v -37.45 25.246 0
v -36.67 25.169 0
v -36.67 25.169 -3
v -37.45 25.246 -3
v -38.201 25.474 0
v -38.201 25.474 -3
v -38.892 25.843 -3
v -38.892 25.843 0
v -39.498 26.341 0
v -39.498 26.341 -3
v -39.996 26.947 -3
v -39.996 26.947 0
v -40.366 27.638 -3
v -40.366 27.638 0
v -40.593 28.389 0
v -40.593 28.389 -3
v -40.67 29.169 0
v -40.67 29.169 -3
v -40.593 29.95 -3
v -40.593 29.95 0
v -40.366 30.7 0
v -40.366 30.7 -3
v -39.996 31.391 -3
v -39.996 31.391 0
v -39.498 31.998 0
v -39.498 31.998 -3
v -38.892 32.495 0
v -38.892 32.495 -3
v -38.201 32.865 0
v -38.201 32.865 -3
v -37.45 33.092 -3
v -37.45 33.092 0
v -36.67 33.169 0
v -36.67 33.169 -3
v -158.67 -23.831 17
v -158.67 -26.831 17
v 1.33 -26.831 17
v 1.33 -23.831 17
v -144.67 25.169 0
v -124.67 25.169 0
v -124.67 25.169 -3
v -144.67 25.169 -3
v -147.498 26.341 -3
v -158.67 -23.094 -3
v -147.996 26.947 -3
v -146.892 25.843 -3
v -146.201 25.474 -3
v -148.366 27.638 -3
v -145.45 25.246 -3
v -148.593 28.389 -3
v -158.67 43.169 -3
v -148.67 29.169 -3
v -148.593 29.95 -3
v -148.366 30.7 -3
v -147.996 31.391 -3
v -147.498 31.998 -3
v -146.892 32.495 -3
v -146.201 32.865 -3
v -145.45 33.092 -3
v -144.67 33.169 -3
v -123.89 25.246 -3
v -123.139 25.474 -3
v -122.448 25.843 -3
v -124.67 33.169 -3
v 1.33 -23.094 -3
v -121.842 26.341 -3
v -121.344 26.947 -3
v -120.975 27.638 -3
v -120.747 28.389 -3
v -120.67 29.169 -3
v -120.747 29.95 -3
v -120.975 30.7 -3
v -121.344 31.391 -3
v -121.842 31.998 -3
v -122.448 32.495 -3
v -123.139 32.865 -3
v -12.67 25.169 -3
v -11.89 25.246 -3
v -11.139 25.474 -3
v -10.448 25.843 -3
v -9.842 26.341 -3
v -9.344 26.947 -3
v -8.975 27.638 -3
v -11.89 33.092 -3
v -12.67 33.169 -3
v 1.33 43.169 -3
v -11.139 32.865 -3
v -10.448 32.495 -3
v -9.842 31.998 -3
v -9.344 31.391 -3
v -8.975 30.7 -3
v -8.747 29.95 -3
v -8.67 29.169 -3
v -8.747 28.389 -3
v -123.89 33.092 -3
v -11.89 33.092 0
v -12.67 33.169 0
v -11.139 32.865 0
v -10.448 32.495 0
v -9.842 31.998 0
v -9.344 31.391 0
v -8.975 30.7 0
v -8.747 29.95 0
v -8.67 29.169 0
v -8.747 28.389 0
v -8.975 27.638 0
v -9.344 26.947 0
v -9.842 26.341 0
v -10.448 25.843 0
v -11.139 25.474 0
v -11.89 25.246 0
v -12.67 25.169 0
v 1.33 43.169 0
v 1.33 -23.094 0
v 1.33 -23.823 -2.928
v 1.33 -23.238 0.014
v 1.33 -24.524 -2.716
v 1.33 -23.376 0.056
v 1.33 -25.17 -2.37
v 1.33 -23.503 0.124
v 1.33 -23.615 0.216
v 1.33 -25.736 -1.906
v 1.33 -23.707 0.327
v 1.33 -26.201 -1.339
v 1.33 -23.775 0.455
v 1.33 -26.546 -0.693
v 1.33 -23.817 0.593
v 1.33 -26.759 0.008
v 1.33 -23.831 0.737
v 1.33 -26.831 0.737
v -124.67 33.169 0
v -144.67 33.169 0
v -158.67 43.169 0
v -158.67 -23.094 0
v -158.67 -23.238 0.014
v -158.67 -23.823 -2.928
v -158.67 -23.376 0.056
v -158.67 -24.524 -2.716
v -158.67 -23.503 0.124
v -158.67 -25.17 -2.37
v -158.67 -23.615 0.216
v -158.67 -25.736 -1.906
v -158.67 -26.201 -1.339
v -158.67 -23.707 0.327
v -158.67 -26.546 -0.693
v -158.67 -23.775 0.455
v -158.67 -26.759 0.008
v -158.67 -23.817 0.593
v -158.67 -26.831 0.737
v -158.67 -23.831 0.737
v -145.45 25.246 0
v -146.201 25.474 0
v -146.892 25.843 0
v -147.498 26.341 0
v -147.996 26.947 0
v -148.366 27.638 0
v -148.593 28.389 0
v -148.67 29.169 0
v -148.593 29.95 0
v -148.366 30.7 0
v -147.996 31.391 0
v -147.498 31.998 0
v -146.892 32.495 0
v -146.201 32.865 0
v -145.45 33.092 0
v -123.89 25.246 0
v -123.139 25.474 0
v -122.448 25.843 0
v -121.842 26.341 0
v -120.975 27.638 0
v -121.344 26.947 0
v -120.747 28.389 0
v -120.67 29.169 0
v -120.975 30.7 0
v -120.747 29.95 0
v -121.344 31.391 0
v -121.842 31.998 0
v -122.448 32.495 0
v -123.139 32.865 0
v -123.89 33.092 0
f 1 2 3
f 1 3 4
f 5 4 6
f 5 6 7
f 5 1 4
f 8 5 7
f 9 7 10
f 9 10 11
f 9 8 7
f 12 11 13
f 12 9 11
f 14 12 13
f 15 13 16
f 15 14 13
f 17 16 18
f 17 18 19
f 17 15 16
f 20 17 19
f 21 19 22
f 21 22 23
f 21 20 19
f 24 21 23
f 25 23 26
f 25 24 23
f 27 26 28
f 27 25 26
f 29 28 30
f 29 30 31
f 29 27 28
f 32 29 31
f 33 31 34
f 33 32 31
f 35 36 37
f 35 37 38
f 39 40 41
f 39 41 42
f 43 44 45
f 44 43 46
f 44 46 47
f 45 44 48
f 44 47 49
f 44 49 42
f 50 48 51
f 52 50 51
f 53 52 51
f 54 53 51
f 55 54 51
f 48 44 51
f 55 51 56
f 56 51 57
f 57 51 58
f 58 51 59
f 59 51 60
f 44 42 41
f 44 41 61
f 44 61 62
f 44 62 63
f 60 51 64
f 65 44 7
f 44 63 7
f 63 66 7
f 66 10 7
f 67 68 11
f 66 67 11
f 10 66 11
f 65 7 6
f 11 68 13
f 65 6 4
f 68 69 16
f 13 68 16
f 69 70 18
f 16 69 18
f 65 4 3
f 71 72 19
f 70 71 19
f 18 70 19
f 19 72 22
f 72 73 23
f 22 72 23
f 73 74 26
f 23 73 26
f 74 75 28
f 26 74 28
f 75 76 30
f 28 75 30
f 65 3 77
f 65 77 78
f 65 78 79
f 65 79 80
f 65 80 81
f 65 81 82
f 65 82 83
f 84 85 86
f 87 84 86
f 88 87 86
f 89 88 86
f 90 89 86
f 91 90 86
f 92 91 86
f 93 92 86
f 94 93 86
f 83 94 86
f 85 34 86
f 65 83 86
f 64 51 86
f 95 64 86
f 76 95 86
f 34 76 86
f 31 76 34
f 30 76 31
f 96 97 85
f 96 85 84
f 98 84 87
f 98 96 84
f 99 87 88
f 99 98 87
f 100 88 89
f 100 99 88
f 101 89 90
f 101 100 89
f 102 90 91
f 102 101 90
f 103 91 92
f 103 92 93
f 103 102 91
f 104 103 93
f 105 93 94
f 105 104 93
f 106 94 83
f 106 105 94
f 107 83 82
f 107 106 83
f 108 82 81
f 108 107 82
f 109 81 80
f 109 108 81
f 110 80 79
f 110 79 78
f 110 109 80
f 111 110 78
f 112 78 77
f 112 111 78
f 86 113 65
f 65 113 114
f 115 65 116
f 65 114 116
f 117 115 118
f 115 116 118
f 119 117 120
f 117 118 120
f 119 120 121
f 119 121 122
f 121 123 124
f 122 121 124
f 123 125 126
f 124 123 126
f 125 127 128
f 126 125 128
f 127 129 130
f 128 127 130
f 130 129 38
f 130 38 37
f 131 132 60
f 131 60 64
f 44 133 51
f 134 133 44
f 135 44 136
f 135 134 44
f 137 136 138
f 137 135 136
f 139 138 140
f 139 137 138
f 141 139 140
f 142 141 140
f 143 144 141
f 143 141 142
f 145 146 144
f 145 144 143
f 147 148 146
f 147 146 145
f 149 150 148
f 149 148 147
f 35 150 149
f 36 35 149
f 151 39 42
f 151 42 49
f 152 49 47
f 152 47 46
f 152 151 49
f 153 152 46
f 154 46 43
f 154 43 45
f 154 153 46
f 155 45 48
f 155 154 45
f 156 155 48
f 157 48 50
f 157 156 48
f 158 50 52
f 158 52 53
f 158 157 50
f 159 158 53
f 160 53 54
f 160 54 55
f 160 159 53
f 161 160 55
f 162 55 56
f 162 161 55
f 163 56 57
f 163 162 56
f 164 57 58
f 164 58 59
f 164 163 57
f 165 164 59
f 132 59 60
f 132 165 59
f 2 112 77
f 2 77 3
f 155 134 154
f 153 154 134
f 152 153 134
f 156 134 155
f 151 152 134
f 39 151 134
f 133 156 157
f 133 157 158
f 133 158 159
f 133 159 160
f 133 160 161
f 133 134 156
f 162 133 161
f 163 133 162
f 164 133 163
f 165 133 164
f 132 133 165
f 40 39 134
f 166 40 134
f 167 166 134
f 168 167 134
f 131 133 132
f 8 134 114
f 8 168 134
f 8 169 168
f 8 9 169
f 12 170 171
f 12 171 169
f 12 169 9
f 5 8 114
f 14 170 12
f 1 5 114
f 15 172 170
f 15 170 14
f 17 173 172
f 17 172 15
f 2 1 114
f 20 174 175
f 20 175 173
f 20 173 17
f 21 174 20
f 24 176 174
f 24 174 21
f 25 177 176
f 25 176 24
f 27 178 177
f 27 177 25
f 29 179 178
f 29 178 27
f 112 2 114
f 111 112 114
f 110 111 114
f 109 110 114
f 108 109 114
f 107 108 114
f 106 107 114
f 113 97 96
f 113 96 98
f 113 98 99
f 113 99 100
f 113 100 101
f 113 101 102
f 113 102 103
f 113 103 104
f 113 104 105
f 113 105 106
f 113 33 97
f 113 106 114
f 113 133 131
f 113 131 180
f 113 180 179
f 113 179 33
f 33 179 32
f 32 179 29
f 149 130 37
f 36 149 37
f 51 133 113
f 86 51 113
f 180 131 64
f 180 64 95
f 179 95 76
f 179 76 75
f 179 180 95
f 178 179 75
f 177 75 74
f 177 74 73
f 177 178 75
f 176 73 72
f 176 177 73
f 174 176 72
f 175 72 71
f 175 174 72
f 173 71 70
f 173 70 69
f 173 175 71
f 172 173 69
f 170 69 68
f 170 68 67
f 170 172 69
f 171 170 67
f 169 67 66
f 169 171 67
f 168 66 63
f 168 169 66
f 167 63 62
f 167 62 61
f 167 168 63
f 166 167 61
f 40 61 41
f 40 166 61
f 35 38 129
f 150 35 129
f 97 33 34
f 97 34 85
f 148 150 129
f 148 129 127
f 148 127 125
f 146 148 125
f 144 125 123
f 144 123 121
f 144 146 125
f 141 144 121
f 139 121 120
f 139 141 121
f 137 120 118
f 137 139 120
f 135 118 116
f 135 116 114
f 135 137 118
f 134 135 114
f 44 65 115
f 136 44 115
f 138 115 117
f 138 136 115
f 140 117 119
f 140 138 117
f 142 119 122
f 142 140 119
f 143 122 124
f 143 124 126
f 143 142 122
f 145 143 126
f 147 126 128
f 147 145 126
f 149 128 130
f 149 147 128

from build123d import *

# Parameters (mm, degrees)
SKETCH2_W                    = 160
SKETCH2_H                    = 70
BASE_FLANGE1_DEPTH           = 3
EDGE_FLANGE1_STRIP_W         = 13.4732
EDGE_FLANGE1_STRIP_H         = 3
EDGE_FLANGE1_STRIP_CUT_DEPTH = 160
EDGE_FLANGE1_DEPTH           = 160


# Sheet-metal steps are written as plain solids
with BuildPart() as part:
    # Sketch2 → Base-Flange1 (new body)
    with BuildSketch(Plane.XY):
        with Locations((-78.670050761, 8.169204738)):
            Rectangle(SKETCH2_W, SKETCH2_H)
        with BuildLine():
            Line((-144.670050761, 33.169204738), (-124.670050761, 33.169204738))
            ThreePointArc((-124.670050761, 33.169204738), (-120.670050761, 29.169204738), (-124.670050761, 25.169204738))
            Line((-124.670050761, 25.169204738), (-144.670050761, 25.169204738))
            ThreePointArc((-144.670050761, 25.169204738), (-148.670050761, 29.169204738), (-144.670050761, 33.169204738))
        make_face(mode=Mode.SUBTRACT)
        with BuildLine():
            Line((-12.670050761, 25.169204738), (-36.670050761, 25.169204738))
            ThreePointArc((-36.670050761, 25.169204738), (-40.670050761, 29.169204738), (-36.670050761, 33.169204738))
            Line((-36.670050761, 33.169204738), (-12.670050761, 33.169204738))
            ThreePointArc((-12.670050761, 33.169204738), (-8.670050761, 29.169204738), (-12.670050761, 25.169204738))
        make_face(mode=Mode.SUBTRACT)
    extrude(amount=-BASE_FLANGE1_DEPTH)

    # Edge-Flange1 strip (across the edge) → Edge-Flange1 strip cut (cut)
    with BuildSketch(Plane(origin=(-158.670050761, -26.830795262, 0), x_dir=(0, 1, 0), z_dir=(1, 0, 0))):
        with Locations((-3, -1.5)):
            Rectangle(EDGE_FLANGE1_STRIP_W, EDGE_FLANGE1_STRIP_H)
    extrude(amount=EDGE_FLANGE1_STRIP_CUT_DEPTH, mode=Mode.SUBTRACT)

    # Edge-Flange1 section (across the edge) → Edge-Flange1 (add)
    with BuildSketch(Plane(origin=(-158.670050761, -26.830795262, 0), x_dir=(0, 1, 0), z_dir=(1, 0, 0))):
        with BuildLine():
            Line((0, 0.7366), (0, 17))
            Line((0, 17), (3, 17))
            Line((3, 17), (3, 0.7366))
            ThreePointArc((3, 0.7366), (3.215745145, 0.215745145), (3.7366, 0))
            Line((3.7366, 0), (3.7366, -3))
            ThreePointArc((3.7366, -3), (1.094424801, -1.905575199), (0, 0.7366))
        make_face()
    extrude(amount=EDGE_FLANGE1_DEPTH)


solid = part.part
